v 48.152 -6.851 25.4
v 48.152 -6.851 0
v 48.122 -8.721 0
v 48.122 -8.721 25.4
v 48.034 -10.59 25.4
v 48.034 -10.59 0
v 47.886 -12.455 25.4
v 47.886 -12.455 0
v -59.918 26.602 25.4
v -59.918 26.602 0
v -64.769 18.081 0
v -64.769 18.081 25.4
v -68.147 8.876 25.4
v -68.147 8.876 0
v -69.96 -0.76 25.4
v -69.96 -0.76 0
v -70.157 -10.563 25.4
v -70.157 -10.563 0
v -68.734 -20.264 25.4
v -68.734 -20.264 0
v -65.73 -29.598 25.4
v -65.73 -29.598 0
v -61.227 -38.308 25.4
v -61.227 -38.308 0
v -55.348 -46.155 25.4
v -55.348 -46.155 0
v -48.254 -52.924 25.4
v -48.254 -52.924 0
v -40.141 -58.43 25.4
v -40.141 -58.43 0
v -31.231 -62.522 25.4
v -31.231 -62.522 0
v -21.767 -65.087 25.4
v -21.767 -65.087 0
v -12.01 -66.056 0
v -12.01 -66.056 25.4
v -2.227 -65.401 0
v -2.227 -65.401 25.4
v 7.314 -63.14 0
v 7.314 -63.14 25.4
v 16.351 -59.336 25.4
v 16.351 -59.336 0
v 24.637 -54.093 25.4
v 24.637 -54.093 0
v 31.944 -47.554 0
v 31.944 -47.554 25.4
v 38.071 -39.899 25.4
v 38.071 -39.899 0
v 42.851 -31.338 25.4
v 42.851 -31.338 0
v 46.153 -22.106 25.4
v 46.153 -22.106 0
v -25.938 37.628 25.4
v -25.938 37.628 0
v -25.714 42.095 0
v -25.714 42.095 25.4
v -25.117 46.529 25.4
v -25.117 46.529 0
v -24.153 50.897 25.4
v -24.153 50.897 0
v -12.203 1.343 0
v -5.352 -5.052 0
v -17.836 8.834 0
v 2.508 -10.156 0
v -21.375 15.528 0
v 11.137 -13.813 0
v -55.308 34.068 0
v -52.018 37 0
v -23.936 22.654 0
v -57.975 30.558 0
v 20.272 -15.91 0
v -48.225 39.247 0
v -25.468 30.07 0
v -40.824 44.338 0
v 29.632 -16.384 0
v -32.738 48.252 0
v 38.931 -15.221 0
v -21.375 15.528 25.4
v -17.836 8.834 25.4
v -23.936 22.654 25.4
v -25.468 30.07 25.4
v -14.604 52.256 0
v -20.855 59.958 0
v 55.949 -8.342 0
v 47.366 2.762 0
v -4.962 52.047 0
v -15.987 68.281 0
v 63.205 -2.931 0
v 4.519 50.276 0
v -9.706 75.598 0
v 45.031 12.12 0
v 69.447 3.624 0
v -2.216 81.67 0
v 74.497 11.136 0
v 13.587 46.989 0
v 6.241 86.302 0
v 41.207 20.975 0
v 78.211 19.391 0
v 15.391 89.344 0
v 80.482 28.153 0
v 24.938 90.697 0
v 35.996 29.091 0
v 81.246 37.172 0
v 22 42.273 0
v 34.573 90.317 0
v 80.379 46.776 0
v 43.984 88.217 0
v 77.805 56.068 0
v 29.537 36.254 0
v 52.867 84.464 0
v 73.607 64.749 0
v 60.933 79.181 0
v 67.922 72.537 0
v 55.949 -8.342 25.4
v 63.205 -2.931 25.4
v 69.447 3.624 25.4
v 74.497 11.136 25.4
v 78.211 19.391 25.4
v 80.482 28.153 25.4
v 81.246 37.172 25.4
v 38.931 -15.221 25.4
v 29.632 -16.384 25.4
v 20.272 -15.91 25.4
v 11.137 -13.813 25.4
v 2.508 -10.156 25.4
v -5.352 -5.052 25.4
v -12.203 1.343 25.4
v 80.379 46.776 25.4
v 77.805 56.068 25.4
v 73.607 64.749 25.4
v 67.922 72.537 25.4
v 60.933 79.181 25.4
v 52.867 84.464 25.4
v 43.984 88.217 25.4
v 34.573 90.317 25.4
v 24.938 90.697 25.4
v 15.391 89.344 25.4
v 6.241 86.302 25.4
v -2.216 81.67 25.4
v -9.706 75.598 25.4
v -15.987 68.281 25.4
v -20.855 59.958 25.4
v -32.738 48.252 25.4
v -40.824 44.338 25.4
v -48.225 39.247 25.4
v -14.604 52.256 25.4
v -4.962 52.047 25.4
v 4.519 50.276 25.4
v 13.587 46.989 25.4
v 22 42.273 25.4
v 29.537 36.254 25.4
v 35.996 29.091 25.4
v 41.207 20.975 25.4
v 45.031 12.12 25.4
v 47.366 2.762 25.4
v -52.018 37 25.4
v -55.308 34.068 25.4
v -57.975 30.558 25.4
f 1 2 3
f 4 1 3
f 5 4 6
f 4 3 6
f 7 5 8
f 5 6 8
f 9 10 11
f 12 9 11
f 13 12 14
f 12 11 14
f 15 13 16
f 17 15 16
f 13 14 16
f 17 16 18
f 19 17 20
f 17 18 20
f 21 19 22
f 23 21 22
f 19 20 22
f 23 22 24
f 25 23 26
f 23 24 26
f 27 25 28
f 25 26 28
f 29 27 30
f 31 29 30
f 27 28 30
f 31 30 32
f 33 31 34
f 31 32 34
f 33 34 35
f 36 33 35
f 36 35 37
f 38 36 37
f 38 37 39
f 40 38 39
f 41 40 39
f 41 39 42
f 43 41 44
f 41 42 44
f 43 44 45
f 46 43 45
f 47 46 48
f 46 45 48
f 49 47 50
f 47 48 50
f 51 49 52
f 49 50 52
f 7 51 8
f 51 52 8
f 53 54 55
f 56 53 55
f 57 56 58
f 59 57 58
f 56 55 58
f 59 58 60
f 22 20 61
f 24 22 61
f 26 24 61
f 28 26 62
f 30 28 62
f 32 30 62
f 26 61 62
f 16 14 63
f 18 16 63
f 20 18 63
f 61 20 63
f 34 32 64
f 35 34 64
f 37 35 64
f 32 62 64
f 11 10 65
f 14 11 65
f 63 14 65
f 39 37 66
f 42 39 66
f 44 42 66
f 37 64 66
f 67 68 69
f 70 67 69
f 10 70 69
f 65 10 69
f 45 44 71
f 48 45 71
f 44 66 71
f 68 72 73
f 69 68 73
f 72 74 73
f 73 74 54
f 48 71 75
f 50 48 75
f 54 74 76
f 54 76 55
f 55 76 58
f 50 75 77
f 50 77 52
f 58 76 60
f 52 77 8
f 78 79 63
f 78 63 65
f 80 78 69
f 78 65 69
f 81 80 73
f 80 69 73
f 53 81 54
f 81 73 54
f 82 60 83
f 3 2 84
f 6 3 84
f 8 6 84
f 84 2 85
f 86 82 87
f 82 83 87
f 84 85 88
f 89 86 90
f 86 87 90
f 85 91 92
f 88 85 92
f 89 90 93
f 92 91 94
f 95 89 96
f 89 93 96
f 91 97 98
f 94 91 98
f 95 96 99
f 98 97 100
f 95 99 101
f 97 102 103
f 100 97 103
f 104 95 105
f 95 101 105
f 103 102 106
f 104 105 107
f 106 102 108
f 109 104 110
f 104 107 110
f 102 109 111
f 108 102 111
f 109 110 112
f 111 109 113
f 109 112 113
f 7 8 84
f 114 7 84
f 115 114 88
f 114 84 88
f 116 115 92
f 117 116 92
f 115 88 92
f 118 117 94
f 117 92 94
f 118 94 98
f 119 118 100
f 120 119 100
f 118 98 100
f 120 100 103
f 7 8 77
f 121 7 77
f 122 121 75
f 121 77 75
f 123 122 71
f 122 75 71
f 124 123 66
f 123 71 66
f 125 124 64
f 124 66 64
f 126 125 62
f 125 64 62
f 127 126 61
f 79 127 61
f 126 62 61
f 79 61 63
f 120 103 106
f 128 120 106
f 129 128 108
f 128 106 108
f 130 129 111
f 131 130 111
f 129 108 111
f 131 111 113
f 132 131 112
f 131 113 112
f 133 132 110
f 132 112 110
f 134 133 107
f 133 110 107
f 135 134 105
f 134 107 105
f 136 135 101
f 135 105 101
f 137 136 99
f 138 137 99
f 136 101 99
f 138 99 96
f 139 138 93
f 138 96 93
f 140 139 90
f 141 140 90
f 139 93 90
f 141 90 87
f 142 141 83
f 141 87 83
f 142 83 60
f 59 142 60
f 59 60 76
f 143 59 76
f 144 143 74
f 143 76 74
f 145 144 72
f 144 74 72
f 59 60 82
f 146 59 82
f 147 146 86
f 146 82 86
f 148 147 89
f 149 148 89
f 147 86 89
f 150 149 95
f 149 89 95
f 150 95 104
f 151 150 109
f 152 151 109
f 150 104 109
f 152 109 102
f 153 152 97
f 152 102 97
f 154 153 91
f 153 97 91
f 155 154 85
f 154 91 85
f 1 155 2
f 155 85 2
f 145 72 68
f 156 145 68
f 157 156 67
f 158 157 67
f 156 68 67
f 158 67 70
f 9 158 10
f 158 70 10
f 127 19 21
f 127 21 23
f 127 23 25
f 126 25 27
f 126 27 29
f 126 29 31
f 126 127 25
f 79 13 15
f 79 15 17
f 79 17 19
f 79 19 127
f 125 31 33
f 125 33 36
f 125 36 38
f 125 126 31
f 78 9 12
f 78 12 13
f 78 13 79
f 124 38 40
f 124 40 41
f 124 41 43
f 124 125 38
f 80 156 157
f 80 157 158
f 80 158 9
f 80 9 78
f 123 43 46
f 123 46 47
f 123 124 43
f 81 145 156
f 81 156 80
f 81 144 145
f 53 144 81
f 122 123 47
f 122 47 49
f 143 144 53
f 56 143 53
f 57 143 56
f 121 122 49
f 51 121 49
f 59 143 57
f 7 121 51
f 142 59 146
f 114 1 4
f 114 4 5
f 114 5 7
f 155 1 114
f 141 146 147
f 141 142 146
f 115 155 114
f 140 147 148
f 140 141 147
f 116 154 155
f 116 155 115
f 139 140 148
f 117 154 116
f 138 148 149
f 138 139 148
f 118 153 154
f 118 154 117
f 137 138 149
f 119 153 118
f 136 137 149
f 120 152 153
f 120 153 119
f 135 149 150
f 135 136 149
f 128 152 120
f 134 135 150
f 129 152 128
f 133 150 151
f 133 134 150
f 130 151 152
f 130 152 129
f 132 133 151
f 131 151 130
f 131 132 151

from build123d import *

# Parameters (mm, degrees)
F1_DEPTH = 25.4


with BuildPart() as f1:
    # F0 (on Top) → F1 (new body)
    with BuildSketch(Plane.XY):
        with BuildLine():
            ThreePointArc((47.886060174, -12.4549665998), (72.1310270555, 7.2734088866), (81.2462326585, 37.1722423961))
            ThreePointArc((81.2462326585, 37.1722423961), (34.5731761302, 90.3168428852), (-24.1531557895, 50.8967882672))
            ThreePointArc((-24.1531557895, 50.8967882672), (25.8912684531, 39.4171072118), (48.1518860988, -6.8505097243))
            ThreePointArc((48.1518860988, -6.8505097243), (48.0853922825, -9.6558884996), (47.886060174, -12.4549665998))
        make_face()
    extrude(amount=F1_DEPTH)


with BuildPart() as f1b:
    # F0 (on Top) → F1, piece 2 (new body)
    with BuildSketch(Plane.XY):
        with BuildLine():
            ThreePointArc((-59.9184655616, 26.6024068911), (-54.5341208369, 33.3519547329), (-48.2254532875, 39.2467217286))
            ThreePointArc((-48.2254532875, 39.2467217286), (-55.3083630994, 34.0679464173), (-59.9184655616, 26.6024068911))
        make_face()
        with BuildLine():
            ThreePointArc((-25.9383554705, 37.6279434525), (-25.4617289431, 44.3183312009), (-24.1531557895, 50.8967882672))
            ThreePointArc((-24.1531557895, 50.8967882672), (-36.8556234904, 46.4485564081), (-48.2254532875, 39.2467217286))
            ThreePointArc((-48.2254532875, 39.2467217286), (-36.8706085411, 41.3464221655), (-25.9383554705, 37.6279434525))
        make_face()
        with BuildLine():
            ThreePointArc((-59.9184655616, 26.6024068911), (-31.2306747799, -62.5222091751), (47.886060174, -12.4549665998))
            ThreePointArc((47.886060174, -12.4549665998), (11.1372492755, -13.8127435197), (-17.8355630487, 8.8344374672))
            ThreePointArc((-17.8355630487, 8.8344374672), (-47.4173757288, -2.5091676282), (-59.9184655616, 26.6024068911))
        make_face()
        with BuildLine():
            ThreePointArc((-17.8355630487, 8.8344374672), (-23.9364774509, 22.6544346984), (-25.9383554705, 37.6279434525))
            ThreePointArc((-25.9383554705, 37.6279434525), (-36.8706085411, 41.3464221655), (-48.2254532875, 39.2467217286))
            ThreePointArc((-48.2254532875, 39.2467217286), (-54.5341208369, 33.3519547329), (-59.9184655616, 26.6024068911))
            ThreePointArc((-59.9184655616, 26.6024068911), (-47.4173757288, -2.5091676282), (-17.8355630487, 8.8344374672))
        make_face()
    extrude(amount=F1_DEPTH)


solid = Compound([f1.part, f1b.part])
